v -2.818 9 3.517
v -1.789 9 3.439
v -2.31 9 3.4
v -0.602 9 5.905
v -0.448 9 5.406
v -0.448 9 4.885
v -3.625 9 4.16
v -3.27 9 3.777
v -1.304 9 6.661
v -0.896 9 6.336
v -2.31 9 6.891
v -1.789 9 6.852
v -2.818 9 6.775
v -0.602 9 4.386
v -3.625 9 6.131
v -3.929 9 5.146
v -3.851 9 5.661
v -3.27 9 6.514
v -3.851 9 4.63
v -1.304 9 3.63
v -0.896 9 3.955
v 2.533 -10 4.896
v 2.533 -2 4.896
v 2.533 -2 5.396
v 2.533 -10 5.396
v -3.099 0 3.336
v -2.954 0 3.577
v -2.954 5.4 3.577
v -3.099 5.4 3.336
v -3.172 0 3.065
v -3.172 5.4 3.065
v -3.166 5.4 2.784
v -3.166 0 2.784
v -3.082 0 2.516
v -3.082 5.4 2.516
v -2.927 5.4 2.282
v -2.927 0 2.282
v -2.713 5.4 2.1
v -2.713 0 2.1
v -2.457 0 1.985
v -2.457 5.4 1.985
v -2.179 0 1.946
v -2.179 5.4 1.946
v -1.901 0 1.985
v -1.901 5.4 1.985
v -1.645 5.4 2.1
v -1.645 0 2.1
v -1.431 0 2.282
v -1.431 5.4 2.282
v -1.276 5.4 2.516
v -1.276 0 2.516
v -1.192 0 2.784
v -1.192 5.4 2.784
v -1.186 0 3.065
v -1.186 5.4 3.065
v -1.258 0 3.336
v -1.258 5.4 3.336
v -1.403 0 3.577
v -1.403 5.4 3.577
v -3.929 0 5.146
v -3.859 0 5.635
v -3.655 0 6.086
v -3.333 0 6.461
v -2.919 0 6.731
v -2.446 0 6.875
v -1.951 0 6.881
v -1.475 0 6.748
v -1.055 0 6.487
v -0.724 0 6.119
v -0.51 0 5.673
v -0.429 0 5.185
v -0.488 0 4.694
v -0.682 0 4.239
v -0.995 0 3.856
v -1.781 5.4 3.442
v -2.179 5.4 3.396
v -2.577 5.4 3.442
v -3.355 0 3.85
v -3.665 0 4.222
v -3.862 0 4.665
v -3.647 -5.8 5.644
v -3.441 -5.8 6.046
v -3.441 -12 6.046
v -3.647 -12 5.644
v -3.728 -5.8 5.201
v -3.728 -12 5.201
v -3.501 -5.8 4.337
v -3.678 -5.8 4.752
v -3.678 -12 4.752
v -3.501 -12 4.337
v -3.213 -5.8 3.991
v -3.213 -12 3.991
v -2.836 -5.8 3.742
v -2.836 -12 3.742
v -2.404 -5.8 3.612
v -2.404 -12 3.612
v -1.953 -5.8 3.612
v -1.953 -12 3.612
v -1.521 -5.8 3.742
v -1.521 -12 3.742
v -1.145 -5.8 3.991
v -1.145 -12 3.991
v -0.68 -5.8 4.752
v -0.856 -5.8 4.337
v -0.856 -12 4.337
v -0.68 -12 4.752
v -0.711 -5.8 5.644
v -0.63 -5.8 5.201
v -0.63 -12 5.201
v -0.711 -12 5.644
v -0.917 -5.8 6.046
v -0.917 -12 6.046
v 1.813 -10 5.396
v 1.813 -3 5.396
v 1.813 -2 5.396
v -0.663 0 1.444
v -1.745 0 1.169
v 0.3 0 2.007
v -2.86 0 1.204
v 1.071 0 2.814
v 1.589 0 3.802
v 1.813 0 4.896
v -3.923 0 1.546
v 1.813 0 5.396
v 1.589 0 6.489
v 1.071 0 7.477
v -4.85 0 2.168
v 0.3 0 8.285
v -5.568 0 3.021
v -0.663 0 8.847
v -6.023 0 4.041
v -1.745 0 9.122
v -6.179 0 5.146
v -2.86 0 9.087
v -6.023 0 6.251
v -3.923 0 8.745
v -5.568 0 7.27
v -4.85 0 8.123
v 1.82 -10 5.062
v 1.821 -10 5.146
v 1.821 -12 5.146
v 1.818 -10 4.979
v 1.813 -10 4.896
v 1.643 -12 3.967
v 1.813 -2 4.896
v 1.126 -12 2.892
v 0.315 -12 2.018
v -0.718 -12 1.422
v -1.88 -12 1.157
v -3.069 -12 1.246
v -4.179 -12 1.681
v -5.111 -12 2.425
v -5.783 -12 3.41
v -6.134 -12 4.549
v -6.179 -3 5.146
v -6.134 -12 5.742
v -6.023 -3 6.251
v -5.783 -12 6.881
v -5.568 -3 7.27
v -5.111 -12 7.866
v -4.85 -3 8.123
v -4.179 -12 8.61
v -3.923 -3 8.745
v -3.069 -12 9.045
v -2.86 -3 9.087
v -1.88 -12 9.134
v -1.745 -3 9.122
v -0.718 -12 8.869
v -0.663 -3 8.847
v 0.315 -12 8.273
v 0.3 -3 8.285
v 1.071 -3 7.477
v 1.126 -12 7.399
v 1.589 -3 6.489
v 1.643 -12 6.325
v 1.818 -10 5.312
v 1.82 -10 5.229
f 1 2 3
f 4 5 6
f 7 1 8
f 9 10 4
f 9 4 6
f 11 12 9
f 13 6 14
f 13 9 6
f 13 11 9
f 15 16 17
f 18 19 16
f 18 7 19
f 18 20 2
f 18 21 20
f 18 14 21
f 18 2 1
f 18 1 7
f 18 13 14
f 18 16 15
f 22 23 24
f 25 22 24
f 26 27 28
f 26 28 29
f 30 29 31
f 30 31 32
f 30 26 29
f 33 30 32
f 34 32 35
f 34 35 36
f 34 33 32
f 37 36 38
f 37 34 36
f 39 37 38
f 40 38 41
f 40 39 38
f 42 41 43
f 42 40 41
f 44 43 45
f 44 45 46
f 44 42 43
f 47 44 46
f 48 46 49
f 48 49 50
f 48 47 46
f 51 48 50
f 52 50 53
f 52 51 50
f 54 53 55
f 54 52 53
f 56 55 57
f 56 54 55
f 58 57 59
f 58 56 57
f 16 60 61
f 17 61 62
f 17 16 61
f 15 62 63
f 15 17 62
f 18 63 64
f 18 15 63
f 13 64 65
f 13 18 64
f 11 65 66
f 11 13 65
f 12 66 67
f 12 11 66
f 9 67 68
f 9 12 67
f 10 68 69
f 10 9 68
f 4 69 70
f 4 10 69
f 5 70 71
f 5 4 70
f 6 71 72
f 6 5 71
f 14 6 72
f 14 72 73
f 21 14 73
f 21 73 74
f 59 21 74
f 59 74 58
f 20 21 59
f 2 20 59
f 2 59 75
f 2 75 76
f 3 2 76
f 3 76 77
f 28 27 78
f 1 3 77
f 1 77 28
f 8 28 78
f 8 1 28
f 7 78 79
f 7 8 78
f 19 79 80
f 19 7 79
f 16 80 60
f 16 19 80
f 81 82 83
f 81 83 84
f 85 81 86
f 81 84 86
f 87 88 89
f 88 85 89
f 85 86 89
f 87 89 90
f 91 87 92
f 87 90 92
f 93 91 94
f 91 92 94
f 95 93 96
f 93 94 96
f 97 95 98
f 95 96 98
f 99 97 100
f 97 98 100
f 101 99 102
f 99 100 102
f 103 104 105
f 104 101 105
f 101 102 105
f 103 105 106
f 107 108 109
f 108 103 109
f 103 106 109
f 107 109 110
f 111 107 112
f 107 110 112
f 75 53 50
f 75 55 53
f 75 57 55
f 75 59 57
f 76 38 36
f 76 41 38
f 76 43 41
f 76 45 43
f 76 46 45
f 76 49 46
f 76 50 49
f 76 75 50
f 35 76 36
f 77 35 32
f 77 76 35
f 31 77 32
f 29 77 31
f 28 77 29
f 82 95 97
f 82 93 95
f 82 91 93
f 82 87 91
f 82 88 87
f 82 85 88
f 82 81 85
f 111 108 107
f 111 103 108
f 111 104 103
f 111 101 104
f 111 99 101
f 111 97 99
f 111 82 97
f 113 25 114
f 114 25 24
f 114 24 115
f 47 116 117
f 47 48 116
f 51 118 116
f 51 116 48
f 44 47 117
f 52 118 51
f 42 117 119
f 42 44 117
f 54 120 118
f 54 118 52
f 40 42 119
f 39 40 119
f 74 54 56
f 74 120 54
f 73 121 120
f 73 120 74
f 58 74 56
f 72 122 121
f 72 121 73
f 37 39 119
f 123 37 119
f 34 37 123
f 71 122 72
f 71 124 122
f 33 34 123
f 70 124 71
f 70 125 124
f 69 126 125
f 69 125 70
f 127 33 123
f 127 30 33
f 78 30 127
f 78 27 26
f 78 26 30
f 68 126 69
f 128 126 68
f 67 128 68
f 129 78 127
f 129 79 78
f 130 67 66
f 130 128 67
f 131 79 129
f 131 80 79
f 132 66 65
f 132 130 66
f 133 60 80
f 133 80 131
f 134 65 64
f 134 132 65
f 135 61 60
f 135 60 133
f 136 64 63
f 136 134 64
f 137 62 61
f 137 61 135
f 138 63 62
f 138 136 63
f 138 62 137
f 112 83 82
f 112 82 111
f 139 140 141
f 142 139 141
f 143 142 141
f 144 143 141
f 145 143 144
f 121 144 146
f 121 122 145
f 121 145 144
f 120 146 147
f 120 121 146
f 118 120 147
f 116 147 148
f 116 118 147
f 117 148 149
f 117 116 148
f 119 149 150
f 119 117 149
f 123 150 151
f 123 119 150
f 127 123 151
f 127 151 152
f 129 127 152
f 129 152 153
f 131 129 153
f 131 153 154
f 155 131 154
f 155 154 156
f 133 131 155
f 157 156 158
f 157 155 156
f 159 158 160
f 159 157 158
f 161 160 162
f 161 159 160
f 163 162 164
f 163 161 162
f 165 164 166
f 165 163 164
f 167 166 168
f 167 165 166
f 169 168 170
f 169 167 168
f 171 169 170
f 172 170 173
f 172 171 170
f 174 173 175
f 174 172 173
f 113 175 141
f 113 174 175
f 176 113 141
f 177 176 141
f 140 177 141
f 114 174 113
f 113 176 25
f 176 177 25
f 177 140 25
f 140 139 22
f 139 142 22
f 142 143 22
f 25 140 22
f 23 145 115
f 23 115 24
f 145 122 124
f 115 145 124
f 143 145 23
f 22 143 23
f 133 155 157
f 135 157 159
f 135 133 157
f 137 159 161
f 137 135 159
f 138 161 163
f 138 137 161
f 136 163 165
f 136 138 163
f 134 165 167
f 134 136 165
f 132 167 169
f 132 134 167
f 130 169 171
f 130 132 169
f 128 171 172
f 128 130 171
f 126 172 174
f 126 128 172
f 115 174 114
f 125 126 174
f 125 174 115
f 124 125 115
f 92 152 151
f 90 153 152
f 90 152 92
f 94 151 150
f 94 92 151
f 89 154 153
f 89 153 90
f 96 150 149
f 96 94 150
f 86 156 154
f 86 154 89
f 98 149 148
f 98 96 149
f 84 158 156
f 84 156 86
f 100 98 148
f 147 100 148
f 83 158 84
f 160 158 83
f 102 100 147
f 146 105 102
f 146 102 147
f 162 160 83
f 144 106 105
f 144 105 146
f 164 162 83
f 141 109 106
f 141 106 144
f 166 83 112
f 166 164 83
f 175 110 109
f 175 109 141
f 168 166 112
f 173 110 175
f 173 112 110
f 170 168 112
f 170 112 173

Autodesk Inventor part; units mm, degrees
ref_plane "YZ Plane" through (0, 0, 0) normal (1, 0, 0) x (0, 1, 0)
ref_plane "XZ Plane" through (0, 0, 0) normal (0, 1, 0) x (-1, 0, 0)
ref_plane "XY Plane" through (0, 0, 0) normal (0, 0, 1) x (1, 0, 0)
sketch "Sketch1" plane through (0, 0, 0) normal (0, 1, 0) x (-1, 0, 0)
  circle A0 centre (2.1789, 5.1456) radius 4
  circle A1 centre (2.1789, 2.9456) radius 1
  circle A2 centre (2.1789, 5.1456) radius 1.75
  point P0 (0, 0)
  dimension "d0" = 8
  dimension "d1" = 2
  dimension "d3" = 3.5
  dimension "d4" = 0
  dimension "d5" = 0
  dimension "d6" = 0
  dimension "d17" = 2.2
extrude "Extrusion1" add sketch "Sketch1" against normal blind 3 contours A0 | A1 A2 | A2 A1 | A1 A2
extrude "Extrusion2" add sketch "Sketch1" along normal blind 5.4 contours A1 A2 | A2 A1 picked at (1.7556, 3.0976) picked at (2.385, 3.5861)
extrude "Extrusion3" add sketch "Sketch1" along normal blind 9 and the other way blind 12 contours A2 A1 | A1 A2 picked at (2.385, 3.5861) picked at (2.2193, 5.9034)
sketch "Sketch2" plane through (-2.1789, -12, 5.1456) normal (0, -1, 0) x (1, 0, 0)
  circle A0 centre (0, 0) radius 4
  circle A1 centre (0, 0) radius 1.55
  line L0 (-1.2619, 0.9) -> (1.2619, 0.9)
  circle A2 centre (0, 0) radius 4 projected
  point P0 (2.1789, -5.1456)
  dimension "d18" = 8
  dimension "d19" = 3.1
  dimension "d20" = 2.45
extrude "Extrusion4" add sketch "Sketch2" against normal blind 9 contours A0 | A1 L0 | L0 A1
extrude "Extrusion5" cut sketch "Sketch2" against normal blind 6.2 contours A1 L0 picked at (-0.0386, 0.0848)
sketch "Sketch3" plane through (-2.1789, 0, 5.1456) normal (0, 1, 0) x (1, 0, 0)
  line L0 (3.7119, 0.25) -> (4.7119, 0.25)
  line L1 (4.7119, 0.25) -> (4.7119, -0.25)
  line L2 (4.7119, -0.25) -> (3.7119, -0.25)
  line L3 (3.7119, -0.25) -> (3.7119, 0.25)
  circle A0 centre (0, 0) radius 4 projected
  point P0 (2.1789, 5.1456)
  dimension "d25" = 0.5
  dimension "d26" = 0.25
  dimension "d27" = 0.25
  dimension "d30" = 1
extrude "Extrusion6" add sketch "Sketch3" against normal blind 10 contours L0 A0 L2 L3 | L0 L1 L2 A0 picked at (3.8079, 0)
sketch "Sketch4" plane through (0, 0, 0) normal (0, 1, 0) x (1, 0, 0)
  line L0 (1.8133, -4.8956) -> (2.5329, -4.8956) projected
  line L1 (2.5329, -5.3956) -> (1.8133, -5.3956) projected
  line L2 (2.5329, -4.8956) -> (1.8133, -4.8956)
  line L3 (1.8133, -4.8956) -> (1.8133, -5.3956)
  line L4 (1.8133, -5.3956) -> (2.5329, -5.3956)
  line L5 (2.5329, -5.3956) -> (2.5329, -4.8956)
  point P0 (0, 0)
extrude "Extrusion7" cut sketch "Sketch4" against normal blind 2
properties part number "kolo"
